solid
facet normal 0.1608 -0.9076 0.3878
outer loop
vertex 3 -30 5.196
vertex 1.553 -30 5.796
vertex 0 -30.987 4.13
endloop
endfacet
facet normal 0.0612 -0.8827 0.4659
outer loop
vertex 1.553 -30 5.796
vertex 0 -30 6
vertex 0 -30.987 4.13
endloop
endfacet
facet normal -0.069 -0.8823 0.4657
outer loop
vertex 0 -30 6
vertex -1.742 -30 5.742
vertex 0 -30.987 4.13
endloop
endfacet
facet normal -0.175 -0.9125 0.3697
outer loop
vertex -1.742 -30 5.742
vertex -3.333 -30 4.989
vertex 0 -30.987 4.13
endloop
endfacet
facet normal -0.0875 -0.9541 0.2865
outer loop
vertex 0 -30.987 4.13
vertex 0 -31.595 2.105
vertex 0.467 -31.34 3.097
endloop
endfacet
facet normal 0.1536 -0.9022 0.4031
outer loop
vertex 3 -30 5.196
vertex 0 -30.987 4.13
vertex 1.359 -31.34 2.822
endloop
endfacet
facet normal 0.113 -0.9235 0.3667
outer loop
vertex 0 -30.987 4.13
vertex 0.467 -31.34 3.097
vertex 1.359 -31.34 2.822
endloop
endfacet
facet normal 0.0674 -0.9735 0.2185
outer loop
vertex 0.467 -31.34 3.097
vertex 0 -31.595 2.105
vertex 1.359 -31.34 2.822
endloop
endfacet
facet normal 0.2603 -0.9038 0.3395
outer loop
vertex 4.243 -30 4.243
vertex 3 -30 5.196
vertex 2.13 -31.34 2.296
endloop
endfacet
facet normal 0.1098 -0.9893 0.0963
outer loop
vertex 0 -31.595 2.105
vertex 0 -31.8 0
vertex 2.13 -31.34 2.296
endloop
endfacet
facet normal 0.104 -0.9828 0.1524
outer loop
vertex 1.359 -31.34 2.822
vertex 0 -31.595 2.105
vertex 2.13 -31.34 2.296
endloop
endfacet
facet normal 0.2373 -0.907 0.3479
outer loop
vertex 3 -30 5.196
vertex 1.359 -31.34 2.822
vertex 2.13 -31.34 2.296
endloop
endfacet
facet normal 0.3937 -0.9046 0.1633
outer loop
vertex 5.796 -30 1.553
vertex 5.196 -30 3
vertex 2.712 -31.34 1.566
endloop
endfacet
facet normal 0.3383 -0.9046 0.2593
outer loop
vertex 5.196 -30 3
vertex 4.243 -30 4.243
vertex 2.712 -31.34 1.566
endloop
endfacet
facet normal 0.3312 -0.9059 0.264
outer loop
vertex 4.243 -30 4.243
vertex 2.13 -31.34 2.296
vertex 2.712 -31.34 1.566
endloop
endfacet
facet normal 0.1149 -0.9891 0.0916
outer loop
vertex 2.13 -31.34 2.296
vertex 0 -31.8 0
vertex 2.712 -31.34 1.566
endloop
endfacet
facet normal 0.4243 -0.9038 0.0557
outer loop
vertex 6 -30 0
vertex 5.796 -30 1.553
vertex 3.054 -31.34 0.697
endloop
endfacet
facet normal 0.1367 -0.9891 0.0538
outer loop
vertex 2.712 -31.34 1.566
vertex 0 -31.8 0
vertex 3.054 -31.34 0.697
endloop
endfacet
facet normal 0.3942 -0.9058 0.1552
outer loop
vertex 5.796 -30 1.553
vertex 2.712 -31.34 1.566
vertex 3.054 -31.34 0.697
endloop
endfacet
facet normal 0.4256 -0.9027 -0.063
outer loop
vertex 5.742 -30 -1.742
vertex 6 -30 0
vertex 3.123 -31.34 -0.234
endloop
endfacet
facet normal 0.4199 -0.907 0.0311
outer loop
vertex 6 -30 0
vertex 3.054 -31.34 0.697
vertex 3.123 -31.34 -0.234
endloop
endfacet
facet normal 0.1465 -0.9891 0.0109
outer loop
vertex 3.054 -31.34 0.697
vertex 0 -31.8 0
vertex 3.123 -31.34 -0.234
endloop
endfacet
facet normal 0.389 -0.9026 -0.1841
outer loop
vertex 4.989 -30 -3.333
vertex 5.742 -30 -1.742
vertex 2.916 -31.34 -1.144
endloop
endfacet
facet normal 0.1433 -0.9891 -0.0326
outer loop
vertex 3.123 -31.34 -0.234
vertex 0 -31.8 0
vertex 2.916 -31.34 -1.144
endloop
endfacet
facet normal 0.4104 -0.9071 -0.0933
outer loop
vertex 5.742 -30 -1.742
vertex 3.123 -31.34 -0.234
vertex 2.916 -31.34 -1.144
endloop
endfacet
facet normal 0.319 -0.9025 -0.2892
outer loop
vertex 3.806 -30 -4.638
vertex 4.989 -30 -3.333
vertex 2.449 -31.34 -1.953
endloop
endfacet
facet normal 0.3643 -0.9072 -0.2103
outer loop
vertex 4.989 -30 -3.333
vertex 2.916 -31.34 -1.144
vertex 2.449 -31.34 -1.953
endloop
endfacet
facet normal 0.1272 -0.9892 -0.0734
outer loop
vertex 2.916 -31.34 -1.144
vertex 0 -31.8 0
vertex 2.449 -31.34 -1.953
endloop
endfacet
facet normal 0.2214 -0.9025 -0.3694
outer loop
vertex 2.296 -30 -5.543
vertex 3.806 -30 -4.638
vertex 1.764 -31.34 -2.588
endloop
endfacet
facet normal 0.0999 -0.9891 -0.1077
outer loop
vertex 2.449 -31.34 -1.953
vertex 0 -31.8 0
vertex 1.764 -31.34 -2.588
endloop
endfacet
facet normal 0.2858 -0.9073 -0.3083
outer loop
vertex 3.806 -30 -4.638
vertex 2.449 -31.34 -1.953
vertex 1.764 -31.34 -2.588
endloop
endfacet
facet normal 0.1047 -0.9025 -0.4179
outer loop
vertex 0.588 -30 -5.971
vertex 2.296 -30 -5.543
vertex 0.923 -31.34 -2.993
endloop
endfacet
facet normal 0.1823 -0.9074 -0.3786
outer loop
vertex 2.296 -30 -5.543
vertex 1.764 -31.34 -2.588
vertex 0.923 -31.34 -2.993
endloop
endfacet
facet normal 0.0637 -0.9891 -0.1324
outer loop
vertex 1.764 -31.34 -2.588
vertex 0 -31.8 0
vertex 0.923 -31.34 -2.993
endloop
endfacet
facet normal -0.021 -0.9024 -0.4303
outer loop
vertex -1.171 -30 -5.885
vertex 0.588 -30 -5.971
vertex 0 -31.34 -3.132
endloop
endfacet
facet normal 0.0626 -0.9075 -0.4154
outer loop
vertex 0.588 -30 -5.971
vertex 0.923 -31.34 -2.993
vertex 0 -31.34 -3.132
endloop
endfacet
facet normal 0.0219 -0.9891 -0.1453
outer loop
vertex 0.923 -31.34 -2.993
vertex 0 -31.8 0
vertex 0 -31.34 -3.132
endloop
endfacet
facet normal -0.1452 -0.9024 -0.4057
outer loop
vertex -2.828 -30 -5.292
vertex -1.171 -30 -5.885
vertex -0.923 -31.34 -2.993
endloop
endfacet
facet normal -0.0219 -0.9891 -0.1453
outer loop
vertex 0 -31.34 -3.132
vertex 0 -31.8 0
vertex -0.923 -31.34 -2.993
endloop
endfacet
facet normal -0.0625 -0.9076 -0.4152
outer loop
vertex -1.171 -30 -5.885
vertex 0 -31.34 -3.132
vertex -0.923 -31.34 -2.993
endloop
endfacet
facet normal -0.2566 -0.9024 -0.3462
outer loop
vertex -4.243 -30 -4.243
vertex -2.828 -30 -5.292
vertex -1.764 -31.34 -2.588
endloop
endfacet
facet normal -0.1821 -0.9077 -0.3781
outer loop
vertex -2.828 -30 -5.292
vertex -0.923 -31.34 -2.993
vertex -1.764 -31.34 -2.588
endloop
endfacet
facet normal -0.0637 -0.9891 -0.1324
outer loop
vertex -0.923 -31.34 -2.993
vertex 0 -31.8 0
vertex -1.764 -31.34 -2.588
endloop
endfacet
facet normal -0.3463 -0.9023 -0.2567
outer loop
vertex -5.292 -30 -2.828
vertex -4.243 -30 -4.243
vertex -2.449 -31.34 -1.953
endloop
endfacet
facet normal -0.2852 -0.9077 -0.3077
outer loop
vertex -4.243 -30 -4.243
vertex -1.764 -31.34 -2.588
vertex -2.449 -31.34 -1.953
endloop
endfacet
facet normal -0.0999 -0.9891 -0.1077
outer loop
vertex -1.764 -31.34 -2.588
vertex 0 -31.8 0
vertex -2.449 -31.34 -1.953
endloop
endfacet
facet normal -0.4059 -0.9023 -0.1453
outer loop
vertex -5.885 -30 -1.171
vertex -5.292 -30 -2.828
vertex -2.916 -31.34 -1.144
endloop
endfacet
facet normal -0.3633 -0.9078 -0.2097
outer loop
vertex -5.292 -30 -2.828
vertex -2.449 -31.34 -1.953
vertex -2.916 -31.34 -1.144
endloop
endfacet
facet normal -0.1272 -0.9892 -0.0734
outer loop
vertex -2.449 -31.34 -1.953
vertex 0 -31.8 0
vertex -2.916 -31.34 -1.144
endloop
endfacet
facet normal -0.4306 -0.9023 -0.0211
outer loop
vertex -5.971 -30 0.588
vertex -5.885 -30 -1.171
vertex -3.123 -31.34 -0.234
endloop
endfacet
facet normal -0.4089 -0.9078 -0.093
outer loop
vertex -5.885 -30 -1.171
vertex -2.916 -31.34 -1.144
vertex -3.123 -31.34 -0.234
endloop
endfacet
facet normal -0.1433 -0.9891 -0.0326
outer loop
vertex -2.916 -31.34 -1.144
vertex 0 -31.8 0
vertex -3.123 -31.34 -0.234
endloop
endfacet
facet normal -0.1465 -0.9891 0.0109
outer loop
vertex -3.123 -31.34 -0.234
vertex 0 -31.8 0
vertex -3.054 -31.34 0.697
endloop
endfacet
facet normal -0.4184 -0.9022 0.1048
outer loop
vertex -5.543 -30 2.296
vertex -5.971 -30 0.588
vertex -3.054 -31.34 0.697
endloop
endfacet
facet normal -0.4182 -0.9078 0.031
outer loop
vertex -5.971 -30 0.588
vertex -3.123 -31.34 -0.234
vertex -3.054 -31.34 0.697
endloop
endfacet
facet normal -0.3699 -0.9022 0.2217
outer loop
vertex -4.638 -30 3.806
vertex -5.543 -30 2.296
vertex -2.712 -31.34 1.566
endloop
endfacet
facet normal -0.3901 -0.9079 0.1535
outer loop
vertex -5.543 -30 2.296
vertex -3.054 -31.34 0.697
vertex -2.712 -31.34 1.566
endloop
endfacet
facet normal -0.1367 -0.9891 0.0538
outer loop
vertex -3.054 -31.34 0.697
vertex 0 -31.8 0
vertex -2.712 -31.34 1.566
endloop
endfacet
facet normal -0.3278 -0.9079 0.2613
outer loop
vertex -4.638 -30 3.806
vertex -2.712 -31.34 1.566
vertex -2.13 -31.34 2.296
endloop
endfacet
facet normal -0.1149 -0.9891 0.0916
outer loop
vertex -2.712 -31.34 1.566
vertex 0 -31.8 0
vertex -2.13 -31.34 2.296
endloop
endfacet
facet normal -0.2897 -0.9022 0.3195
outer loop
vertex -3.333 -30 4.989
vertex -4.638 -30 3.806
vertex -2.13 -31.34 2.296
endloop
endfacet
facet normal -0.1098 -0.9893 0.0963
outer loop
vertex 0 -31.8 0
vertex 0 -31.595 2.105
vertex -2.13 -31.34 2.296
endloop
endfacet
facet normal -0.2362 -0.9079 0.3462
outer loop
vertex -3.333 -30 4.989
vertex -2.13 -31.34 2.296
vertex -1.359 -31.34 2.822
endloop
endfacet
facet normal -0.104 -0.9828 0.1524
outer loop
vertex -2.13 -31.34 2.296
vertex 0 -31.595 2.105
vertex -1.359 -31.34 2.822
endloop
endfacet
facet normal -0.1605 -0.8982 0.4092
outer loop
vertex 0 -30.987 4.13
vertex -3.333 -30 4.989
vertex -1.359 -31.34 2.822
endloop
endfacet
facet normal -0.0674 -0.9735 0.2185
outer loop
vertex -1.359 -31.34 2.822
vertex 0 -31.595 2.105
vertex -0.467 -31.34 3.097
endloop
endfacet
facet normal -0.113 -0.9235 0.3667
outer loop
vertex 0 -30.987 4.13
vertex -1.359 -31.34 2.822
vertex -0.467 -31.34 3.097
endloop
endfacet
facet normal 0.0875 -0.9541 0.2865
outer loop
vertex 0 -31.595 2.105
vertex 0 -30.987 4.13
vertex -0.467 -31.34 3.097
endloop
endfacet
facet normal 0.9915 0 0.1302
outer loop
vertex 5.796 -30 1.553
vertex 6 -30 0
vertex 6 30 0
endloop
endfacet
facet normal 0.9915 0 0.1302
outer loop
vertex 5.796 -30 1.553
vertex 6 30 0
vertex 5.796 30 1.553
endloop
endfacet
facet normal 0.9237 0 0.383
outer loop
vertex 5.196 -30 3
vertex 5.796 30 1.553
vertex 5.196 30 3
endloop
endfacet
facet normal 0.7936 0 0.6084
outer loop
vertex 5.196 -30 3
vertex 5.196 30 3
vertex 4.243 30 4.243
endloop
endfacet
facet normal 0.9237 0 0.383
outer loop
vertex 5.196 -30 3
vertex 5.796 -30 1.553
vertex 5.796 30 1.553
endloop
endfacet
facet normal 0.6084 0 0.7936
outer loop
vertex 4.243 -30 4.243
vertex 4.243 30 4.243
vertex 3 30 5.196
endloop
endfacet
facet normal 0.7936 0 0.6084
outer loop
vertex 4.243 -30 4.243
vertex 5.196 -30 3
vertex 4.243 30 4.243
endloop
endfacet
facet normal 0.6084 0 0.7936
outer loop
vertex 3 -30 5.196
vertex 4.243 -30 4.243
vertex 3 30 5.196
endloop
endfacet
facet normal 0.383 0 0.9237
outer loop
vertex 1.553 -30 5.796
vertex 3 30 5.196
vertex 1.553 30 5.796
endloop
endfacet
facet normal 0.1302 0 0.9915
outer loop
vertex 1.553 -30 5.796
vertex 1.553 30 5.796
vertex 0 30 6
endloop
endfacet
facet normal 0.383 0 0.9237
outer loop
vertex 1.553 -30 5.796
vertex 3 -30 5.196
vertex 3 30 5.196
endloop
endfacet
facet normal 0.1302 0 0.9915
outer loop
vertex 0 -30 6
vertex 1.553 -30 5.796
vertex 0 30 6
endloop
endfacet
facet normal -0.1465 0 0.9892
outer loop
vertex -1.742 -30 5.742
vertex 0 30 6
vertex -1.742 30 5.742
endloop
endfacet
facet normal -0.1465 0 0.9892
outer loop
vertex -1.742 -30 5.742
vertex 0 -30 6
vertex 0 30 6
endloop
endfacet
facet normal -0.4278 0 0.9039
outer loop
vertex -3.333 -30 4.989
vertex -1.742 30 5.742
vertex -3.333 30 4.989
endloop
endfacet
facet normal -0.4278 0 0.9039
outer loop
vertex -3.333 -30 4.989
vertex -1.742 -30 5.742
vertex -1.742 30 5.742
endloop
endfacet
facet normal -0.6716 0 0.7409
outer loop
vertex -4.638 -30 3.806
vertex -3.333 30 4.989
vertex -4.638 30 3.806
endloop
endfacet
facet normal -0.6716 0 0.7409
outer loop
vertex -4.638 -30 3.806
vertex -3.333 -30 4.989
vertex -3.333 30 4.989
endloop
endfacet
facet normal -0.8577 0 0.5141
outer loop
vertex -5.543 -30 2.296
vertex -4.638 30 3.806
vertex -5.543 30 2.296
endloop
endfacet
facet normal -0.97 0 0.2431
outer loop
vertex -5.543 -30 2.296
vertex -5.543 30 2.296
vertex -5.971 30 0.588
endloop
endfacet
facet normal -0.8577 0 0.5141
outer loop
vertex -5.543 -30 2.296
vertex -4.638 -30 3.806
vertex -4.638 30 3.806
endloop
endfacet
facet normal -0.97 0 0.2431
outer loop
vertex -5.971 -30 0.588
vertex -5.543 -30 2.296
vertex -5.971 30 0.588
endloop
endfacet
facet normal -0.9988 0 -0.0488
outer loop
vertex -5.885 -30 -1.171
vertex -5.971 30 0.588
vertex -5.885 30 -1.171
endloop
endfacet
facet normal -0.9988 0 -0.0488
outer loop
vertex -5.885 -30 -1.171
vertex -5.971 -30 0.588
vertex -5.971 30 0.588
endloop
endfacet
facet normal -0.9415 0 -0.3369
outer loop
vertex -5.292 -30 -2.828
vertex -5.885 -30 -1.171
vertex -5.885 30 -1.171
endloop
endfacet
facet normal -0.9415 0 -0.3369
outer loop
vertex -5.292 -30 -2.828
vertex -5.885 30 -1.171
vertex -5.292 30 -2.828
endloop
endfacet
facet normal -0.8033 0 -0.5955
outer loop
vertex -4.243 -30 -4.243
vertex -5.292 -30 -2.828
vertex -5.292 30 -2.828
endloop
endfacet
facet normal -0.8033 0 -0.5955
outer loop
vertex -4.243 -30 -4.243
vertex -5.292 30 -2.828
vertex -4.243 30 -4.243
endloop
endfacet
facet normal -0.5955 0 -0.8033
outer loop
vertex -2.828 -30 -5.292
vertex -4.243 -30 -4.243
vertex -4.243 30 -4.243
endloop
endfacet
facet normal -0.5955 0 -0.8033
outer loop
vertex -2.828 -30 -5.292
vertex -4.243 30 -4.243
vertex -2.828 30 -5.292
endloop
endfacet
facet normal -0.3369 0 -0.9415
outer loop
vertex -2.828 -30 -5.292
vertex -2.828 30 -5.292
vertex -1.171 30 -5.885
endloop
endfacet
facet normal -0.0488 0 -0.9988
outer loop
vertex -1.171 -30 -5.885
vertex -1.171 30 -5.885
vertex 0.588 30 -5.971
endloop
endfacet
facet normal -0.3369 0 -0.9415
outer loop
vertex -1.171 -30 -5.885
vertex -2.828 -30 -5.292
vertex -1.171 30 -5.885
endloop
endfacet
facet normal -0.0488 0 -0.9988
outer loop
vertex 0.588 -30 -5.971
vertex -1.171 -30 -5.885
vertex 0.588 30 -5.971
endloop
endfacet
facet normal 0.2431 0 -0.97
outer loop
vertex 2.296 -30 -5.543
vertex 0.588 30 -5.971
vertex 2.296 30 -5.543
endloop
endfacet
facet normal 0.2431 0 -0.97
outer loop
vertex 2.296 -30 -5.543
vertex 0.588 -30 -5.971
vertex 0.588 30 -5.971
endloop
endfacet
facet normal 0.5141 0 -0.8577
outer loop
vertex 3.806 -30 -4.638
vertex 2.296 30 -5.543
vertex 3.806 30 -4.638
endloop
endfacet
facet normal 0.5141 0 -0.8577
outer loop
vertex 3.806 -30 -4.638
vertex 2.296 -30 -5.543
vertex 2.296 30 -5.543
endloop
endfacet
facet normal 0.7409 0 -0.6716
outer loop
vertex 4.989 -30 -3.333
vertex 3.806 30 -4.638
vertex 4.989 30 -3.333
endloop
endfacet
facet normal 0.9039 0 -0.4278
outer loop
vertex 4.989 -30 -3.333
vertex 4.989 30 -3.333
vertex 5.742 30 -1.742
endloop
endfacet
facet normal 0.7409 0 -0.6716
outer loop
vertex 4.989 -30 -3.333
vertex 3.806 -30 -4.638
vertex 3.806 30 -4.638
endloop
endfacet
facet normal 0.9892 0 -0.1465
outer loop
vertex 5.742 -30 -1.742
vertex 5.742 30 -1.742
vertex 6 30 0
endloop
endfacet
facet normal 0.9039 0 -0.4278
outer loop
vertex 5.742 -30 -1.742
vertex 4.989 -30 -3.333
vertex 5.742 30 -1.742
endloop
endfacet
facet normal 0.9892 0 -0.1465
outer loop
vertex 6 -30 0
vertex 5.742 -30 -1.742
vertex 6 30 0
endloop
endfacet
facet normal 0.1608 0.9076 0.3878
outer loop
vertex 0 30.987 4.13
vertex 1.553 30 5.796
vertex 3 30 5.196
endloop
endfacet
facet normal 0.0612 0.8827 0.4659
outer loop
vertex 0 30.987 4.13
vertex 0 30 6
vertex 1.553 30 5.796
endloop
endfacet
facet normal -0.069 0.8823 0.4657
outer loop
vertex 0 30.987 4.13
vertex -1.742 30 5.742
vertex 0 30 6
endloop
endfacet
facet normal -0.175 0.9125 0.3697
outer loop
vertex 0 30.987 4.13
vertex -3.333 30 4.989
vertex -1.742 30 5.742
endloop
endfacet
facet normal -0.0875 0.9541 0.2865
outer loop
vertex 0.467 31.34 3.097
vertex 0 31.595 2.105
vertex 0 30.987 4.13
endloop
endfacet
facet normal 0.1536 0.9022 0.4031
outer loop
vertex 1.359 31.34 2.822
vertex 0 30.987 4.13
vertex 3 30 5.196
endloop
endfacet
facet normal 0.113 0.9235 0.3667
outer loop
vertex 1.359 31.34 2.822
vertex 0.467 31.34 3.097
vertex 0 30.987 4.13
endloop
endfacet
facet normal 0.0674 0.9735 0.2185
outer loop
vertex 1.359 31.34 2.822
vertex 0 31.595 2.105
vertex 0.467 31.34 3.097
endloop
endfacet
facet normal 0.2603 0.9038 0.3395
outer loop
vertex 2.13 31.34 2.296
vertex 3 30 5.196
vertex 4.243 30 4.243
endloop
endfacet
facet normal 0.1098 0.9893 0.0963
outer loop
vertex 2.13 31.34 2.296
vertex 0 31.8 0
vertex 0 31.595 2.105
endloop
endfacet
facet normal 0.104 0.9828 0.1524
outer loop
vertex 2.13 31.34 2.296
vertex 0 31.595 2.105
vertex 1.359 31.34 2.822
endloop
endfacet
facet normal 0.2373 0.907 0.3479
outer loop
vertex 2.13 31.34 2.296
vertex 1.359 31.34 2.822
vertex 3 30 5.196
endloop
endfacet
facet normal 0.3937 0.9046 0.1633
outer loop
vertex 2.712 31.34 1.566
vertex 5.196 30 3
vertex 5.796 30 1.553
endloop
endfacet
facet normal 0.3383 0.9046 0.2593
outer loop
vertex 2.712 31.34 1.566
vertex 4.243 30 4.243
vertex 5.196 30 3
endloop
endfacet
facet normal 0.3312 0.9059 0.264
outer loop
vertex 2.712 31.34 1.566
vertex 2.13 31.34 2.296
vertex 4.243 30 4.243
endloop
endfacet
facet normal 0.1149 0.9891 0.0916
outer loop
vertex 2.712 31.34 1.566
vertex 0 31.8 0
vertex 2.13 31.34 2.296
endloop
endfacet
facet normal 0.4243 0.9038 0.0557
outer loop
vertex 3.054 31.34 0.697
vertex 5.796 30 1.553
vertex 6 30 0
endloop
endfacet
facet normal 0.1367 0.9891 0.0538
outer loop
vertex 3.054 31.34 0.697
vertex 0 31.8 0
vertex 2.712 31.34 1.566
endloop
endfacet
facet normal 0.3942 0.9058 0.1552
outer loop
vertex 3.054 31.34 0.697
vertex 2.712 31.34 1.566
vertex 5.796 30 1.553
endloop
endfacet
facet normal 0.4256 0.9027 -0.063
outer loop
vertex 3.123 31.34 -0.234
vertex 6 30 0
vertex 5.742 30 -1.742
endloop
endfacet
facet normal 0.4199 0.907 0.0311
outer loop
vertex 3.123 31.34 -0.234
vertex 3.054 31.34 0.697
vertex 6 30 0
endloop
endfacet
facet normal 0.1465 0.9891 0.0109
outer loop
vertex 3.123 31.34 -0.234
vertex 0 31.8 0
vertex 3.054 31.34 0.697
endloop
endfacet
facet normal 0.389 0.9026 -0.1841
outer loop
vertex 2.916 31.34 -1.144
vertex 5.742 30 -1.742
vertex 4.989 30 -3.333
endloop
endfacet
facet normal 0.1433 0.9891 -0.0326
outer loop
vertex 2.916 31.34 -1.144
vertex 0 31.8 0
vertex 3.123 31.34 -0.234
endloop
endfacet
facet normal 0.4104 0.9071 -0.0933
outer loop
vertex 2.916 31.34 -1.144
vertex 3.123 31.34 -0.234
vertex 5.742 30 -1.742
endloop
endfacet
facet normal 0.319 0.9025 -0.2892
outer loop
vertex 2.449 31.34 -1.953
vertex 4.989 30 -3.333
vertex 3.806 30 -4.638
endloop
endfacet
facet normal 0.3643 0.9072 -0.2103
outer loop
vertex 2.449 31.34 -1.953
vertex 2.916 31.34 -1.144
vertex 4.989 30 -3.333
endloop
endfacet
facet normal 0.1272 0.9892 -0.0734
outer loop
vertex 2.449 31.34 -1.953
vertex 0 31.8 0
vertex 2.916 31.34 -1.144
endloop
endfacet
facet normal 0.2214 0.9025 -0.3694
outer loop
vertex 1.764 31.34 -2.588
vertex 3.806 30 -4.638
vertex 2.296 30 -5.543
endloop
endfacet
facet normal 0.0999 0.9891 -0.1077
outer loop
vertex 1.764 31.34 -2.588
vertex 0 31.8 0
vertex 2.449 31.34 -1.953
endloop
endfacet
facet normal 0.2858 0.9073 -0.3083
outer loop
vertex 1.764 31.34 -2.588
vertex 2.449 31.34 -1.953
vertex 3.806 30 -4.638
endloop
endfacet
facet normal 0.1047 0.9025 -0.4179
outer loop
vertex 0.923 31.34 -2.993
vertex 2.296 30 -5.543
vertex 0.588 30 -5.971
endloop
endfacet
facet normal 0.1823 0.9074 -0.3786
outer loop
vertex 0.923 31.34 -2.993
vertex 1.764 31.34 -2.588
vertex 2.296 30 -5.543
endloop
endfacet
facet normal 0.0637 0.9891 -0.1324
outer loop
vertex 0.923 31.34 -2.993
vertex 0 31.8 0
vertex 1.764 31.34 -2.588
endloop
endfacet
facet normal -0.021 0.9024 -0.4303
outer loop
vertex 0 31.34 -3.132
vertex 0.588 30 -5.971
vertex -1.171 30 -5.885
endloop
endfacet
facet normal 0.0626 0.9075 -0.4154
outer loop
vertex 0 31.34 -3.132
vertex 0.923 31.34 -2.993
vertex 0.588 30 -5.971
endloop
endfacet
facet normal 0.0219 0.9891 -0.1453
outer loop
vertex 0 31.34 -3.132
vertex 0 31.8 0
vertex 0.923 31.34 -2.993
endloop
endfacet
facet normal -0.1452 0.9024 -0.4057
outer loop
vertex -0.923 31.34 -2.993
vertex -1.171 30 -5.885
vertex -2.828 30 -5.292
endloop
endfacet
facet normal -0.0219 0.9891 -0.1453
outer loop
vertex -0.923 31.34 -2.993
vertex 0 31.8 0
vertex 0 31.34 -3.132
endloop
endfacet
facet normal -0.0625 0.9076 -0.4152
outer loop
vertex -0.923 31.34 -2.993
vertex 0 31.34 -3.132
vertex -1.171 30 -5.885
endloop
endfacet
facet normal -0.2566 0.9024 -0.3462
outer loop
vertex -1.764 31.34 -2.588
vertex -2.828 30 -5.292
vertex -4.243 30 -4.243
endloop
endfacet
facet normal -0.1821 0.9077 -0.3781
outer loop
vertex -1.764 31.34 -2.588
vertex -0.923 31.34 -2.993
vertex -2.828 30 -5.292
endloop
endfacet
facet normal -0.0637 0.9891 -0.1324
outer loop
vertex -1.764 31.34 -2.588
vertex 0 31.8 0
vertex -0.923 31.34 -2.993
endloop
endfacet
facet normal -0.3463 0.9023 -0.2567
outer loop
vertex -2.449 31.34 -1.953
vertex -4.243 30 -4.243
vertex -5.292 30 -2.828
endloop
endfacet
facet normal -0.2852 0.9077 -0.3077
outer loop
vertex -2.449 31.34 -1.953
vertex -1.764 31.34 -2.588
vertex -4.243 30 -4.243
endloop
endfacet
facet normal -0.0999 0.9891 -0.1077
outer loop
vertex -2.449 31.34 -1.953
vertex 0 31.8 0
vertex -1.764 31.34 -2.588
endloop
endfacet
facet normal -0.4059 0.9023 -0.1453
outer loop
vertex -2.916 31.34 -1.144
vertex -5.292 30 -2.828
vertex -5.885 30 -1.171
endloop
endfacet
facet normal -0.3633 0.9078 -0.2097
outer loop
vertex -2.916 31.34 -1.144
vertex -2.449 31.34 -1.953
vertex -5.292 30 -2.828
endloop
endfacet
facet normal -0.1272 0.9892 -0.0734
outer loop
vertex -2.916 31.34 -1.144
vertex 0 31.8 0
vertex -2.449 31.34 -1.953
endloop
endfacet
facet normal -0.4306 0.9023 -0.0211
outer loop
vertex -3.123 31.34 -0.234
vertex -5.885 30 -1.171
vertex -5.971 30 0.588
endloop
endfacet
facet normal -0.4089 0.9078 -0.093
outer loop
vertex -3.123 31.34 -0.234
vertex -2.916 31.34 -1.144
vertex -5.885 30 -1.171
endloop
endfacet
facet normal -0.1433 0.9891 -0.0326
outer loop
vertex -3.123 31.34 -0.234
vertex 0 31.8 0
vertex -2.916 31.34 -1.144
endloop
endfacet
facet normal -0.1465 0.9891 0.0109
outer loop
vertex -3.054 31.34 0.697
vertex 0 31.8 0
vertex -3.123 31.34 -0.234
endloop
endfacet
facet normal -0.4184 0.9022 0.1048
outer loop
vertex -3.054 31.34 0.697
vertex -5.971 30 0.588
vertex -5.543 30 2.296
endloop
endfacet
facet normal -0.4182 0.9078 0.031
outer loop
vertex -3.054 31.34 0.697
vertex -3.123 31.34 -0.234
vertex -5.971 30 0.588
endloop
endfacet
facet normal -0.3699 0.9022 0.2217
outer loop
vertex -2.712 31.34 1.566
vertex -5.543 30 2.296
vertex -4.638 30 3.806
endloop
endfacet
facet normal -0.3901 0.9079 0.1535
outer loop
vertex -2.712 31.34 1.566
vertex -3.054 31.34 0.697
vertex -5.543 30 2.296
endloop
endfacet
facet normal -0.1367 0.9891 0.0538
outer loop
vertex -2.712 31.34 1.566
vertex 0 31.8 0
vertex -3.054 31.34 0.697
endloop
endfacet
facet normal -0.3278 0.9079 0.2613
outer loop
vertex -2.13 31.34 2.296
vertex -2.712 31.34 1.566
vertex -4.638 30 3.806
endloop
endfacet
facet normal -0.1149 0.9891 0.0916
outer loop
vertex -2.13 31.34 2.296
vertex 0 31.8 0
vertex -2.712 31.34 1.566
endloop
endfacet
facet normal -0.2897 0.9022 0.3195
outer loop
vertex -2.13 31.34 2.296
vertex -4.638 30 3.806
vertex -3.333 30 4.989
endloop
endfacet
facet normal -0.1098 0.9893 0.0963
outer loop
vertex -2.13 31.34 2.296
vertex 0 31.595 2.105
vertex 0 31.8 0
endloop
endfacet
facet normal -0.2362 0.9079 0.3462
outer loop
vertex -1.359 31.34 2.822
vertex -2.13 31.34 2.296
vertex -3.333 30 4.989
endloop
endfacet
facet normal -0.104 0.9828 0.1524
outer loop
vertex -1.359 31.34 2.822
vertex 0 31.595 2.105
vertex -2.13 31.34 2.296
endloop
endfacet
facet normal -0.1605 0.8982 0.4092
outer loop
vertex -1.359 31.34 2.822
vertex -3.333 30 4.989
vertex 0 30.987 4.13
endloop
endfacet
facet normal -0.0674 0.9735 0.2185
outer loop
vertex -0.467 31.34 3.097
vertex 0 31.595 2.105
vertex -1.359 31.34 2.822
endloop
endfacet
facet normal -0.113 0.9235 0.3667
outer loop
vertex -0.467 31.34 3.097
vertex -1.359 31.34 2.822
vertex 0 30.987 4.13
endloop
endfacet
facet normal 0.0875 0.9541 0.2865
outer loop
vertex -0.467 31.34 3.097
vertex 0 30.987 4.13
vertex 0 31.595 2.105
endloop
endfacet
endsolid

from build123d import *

# Parameters (mm, degrees)
F0_R          = 6
F1_DEPTH      = 30
F1_DEPTH_BACK = 30


# Not quite as in the source:
# - a pattern or mirror of a feature is missing from the dataset's text; its kind, count and spacing are read off the source's solid


with BuildPart() as f1:
    # F0 (on Front) → F1 (new body, two sides)
    with BuildSketch(Plane.XZ) as f1_sk:
        Circle(F0_R)
    extrude(amount=F1_DEPTH)
    extrude(f1_sk.sketch, amount=-F1_DEPTH_BACK)

    # F2 (on Right) → F3 (revolve)
    with BuildSketch(Plane.YZ):
        with BuildLine():
            Line((-31.8, 0), (-30, 0))
            Line((-30, 0), (-30, 6))
            ThreePointArc((-30, 6), (-31.3403065089, 3.1320919527), (-31.8, 0))
        make_face()
    f3 = revolve(axis=Axis((0, 0, 0), (0, 1, 0)))

    # F3_copies: F3 across plane
    add(f3.mirror(Plane.ZX))


solid = f1.part
